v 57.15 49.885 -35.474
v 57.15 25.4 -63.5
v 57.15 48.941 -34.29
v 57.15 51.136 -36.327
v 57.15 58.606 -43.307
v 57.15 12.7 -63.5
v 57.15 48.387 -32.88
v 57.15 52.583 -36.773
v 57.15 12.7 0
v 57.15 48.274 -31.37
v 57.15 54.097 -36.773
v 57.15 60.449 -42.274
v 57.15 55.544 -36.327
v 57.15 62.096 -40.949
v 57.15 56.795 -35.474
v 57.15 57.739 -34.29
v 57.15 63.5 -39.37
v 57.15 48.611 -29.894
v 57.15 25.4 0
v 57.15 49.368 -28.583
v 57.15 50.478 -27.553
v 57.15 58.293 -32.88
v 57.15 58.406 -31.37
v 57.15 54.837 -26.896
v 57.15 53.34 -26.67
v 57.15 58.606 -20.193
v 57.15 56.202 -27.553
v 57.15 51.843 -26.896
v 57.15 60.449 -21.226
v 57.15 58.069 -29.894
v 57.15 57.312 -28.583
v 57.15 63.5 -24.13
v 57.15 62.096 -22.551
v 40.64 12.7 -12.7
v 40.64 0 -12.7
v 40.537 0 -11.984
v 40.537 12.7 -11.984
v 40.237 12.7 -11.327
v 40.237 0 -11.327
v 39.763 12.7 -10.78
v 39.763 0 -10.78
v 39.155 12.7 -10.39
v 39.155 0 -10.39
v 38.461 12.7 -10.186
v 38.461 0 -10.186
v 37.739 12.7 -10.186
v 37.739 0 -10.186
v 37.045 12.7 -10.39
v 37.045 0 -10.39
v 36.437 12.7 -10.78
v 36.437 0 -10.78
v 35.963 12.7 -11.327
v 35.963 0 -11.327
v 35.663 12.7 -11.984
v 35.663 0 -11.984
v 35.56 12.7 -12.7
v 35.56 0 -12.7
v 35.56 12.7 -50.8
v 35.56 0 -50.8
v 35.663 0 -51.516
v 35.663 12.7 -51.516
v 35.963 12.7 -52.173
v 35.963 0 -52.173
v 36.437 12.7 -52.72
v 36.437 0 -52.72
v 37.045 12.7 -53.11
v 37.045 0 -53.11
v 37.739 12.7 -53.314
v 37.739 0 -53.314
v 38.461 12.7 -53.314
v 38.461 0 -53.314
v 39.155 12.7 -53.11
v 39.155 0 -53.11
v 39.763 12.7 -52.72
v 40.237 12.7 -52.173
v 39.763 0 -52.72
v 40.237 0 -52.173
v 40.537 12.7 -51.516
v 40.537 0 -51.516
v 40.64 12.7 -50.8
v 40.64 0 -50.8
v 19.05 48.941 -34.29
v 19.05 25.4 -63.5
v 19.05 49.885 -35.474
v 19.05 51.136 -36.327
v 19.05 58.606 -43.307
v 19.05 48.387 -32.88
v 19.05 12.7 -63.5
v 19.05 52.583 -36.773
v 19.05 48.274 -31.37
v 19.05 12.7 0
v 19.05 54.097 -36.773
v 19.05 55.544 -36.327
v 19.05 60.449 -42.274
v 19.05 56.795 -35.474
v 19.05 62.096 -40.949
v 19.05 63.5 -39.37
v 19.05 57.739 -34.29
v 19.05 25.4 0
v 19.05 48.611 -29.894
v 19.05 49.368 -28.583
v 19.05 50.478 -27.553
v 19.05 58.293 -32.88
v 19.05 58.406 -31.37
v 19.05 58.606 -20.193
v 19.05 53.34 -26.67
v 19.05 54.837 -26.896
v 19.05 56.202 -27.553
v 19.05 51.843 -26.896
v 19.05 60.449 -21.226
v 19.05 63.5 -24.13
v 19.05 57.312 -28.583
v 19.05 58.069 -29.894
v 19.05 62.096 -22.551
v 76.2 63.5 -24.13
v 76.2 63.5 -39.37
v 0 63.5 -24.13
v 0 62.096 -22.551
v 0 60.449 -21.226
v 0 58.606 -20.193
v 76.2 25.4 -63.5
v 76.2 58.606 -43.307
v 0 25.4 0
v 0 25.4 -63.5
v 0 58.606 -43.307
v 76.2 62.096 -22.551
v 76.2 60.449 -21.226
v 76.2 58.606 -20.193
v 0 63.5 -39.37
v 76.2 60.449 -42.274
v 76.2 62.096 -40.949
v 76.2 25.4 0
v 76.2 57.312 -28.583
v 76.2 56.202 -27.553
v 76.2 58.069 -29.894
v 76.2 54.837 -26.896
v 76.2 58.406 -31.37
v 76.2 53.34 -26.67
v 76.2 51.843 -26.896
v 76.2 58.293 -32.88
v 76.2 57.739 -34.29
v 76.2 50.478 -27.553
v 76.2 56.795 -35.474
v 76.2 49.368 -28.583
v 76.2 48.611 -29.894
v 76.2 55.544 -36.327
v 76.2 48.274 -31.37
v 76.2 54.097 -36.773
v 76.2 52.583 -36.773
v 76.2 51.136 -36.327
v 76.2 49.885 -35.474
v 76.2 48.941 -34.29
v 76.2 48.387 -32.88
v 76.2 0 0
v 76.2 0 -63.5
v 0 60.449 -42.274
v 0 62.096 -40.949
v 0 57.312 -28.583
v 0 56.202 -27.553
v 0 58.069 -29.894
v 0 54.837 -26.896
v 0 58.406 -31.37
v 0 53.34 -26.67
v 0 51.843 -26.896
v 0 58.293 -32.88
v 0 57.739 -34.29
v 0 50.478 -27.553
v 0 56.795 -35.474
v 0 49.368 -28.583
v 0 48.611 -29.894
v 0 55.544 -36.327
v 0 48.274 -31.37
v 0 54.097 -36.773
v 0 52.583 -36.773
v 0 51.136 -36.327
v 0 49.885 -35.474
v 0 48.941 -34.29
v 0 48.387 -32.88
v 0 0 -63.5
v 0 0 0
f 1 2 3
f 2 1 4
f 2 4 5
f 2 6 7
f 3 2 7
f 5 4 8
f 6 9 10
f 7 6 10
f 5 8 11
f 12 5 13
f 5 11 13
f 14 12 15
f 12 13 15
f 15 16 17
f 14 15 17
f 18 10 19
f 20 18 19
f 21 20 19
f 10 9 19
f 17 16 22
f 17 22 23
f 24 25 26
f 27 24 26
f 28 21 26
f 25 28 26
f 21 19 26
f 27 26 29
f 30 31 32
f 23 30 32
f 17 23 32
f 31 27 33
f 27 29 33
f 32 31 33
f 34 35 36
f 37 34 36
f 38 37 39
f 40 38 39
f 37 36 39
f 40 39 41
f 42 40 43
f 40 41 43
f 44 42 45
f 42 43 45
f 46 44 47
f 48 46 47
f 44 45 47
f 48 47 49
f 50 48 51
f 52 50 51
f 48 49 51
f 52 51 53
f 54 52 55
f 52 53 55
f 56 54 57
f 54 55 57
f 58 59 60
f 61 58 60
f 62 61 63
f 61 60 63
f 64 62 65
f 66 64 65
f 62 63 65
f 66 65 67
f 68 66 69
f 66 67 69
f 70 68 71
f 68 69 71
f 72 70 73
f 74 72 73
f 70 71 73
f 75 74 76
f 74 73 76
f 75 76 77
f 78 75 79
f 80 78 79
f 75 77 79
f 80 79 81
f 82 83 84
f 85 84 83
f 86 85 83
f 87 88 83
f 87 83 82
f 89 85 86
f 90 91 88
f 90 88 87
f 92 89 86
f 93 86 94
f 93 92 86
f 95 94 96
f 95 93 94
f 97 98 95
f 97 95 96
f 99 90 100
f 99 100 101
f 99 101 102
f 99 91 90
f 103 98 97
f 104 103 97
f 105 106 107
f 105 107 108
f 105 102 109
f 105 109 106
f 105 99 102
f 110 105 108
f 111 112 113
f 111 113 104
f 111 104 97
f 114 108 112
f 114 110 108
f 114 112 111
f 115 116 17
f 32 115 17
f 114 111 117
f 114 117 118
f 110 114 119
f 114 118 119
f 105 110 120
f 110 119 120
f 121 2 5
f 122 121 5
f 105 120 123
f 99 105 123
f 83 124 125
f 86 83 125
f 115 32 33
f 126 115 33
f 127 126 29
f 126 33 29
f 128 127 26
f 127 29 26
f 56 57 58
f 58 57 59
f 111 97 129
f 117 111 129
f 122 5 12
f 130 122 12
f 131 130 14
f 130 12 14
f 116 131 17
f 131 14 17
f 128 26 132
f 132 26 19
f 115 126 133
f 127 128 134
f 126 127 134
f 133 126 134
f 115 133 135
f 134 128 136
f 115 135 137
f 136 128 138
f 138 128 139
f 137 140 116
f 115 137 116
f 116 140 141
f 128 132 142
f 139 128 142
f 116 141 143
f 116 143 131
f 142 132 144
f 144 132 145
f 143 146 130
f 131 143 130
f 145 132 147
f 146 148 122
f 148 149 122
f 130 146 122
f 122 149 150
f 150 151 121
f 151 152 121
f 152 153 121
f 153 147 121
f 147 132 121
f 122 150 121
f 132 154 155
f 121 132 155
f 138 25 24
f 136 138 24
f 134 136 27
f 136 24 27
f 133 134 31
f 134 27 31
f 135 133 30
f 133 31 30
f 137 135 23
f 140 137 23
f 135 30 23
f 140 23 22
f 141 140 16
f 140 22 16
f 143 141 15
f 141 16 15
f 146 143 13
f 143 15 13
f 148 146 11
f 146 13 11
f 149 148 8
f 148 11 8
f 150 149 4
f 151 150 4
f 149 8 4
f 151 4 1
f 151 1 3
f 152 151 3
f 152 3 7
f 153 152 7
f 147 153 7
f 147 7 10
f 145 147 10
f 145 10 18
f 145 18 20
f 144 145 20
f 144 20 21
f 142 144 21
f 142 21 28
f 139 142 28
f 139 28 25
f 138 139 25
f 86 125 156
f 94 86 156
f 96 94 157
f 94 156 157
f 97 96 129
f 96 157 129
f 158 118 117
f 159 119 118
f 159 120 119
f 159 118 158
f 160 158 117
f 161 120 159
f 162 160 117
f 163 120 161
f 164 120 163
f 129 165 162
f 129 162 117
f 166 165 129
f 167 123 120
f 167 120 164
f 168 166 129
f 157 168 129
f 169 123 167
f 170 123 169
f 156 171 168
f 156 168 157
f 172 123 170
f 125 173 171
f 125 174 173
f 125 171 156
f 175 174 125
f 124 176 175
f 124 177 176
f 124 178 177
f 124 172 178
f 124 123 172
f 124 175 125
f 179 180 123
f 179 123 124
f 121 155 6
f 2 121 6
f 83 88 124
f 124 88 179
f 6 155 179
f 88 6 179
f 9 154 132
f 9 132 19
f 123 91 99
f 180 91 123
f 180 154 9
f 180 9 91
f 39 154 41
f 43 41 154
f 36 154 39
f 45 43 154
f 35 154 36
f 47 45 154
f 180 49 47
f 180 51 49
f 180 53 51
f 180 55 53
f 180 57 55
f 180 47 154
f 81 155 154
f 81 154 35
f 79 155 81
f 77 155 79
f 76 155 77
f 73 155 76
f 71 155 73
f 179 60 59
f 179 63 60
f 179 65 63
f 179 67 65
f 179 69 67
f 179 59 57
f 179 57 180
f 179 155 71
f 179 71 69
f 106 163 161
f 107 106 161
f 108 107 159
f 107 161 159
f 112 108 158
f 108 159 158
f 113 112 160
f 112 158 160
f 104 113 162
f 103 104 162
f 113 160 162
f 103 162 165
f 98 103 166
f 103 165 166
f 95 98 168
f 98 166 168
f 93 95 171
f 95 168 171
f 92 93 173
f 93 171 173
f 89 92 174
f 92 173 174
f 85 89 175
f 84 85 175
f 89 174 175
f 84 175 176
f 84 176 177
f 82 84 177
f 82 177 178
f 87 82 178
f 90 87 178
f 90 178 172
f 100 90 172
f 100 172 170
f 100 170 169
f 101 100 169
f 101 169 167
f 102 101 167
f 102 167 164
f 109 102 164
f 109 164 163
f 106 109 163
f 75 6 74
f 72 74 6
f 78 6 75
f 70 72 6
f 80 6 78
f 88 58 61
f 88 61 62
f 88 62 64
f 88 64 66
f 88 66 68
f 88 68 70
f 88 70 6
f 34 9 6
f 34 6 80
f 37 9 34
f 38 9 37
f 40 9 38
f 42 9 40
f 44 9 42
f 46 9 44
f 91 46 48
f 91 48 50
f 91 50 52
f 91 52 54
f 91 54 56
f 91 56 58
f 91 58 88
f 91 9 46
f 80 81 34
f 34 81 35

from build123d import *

# Parameters (mm, degrees)
SKETCH1_W                = 76.2
SKETCH1_H                = 63.5
BOSS_EXTRUDE2_DEPTH      = 63.5
SKETCH6_W                = 38.1
SKETCH6_H                = 50.8
CUT_EXTRUDE4_DEPTH       = 63.5
CUT_EXTRUDE6_DEPTH       = 118.774954893
CUT_EXTRUDE6_DEPTH_BACK  = 118.774954893
SKETCH9_R                = 5.08
CUT_EXTRUDE7_DEPTH       = 118.774954893
CUT_EXTRUDE10_DEPTH      = 118.774954893
CUT_EXTRUDE15_DEPTH      = 118.774954893
CUT_EXTRUDE15_DEPTH_BACK = 118.774954893


with BuildPart() as part:
    # Sketch1 → Boss-Extrude2 (new body)
    with BuildSketch(Plane(origin=(0, 0, 0), x_dir=(1, 0, 0), z_dir=(0, 1, 0))):
        with Locations((38.1, 31.75)):
            Rectangle(SKETCH1_W, SKETCH1_H)
    boss_extrude2 = extrude(amount=BOSS_EXTRUDE2_DEPTH)

    # Sketch6 → Cut-Extrude4 (cut)
    with BuildSketch(Plane.XY):
        with Locations((38.1, 38.1)):
            Rectangle(SKETCH6_W, SKETCH6_H)
    cut_extrude4 = extrude(amount=-CUT_EXTRUDE4_DEPTH, mode=Mode.SUBTRACT)

    # Sketch7 → Cut-Extrude6 (cut, two sides: drawn at the far end of the back side and taken through both)
    with BuildSketch(Plane(origin=(0, 0, 0), x_dir=(1, 0, 0), z_dir=(0, 1, 0)).offset(-CUT_EXTRUDE6_DEPTH_BACK)):
        Polygon((38.1, -158.106178129), (38.1, 0), (38.1, 63.5), (38.1, 221.606178129), (354.312356258, 221.606178129), (354.312356258, -158.106178129), align=None)
    extrude(amount=CUT_EXTRUDE6_DEPTH + CUT_EXTRUDE6_DEPTH_BACK, mode=Mode.SUBTRACT)

    # Mirror3: Boss-Extrude2, Cut-Extrude4 across plane
    add(boss_extrude2.mirror(Plane(origin=(38.1, 226.593693616, 0), x_dir=(0, 0, 1), z_dir=(-1, 0, 0))))
    add(cut_extrude4.mirror(Plane(origin=(38.1, 226.593693616, 0), x_dir=(0, 0, 1), z_dir=(-1, 0, 0))), mode=Mode.SUBTRACT)

    # Sketch9 → Cut-Extrude7 (cut, through all)
    with BuildSketch(Plane.ZY):
        with Locations((-31.75, 53.34)):
            Circle(SKETCH9_R)
    extrude(amount=-CUT_EXTRUDE7_DEPTH, mode=Mode.SUBTRACT)

    # Sketch10 → Cut-Extrude10 (cut, through all)
    with BuildSketch(Plane.ZY):
        with BuildLine():
            Line((-63.5, 63.5), (-63.5, 25.4))
            Line((-63.5, 25.4), (-43.307, 58.60552476))
            ThreePointArc((-43.307, 58.60552476), (-41.64587309, 61.300006016), (-39.37, 63.5))
            Line((-39.37, 63.5), (-63.5, 63.5))
        make_face()
        with BuildLine():
            ThreePointArc((-24.13, 63.5), (-21.85412691, 61.300006016), (-20.193, 58.60552476))
            Line((-20.193, 58.60552476), (0, 25.4))
            Line((0, 25.4), (0, 63.5))
            Line((0, 63.5), (-24.13, 63.5))
        make_face()
    extrude(amount=-CUT_EXTRUDE10_DEPTH, mode=Mode.SUBTRACT)

    # Sketch11 → Cut-Extrude15 (cut, two sides: drawn at the far end of the back side and taken through both)
    with BuildSketch(Plane(origin=(0, 0, 0), x_dir=(1, 0, 0), z_dir=(0, 1, 0)).offset(-CUT_EXTRUDE15_DEPTH_BACK)):
        with BuildLine():
            Line((40.64, 50.8), (40.64, 12.7))
            ThreePointArc((40.64, 12.7), (38.1, 10.16), (35.56, 12.7))
            Line((35.56, 12.7), (35.56, 50.8))
            ThreePointArc((35.56, 50.8), (38.1, 53.34), (40.64, 50.8))
        make_face()
    extrude(amount=CUT_EXTRUDE15_DEPTH + CUT_EXTRUDE15_DEPTH_BACK, mode=Mode.SUBTRACT)


solid = part.part
